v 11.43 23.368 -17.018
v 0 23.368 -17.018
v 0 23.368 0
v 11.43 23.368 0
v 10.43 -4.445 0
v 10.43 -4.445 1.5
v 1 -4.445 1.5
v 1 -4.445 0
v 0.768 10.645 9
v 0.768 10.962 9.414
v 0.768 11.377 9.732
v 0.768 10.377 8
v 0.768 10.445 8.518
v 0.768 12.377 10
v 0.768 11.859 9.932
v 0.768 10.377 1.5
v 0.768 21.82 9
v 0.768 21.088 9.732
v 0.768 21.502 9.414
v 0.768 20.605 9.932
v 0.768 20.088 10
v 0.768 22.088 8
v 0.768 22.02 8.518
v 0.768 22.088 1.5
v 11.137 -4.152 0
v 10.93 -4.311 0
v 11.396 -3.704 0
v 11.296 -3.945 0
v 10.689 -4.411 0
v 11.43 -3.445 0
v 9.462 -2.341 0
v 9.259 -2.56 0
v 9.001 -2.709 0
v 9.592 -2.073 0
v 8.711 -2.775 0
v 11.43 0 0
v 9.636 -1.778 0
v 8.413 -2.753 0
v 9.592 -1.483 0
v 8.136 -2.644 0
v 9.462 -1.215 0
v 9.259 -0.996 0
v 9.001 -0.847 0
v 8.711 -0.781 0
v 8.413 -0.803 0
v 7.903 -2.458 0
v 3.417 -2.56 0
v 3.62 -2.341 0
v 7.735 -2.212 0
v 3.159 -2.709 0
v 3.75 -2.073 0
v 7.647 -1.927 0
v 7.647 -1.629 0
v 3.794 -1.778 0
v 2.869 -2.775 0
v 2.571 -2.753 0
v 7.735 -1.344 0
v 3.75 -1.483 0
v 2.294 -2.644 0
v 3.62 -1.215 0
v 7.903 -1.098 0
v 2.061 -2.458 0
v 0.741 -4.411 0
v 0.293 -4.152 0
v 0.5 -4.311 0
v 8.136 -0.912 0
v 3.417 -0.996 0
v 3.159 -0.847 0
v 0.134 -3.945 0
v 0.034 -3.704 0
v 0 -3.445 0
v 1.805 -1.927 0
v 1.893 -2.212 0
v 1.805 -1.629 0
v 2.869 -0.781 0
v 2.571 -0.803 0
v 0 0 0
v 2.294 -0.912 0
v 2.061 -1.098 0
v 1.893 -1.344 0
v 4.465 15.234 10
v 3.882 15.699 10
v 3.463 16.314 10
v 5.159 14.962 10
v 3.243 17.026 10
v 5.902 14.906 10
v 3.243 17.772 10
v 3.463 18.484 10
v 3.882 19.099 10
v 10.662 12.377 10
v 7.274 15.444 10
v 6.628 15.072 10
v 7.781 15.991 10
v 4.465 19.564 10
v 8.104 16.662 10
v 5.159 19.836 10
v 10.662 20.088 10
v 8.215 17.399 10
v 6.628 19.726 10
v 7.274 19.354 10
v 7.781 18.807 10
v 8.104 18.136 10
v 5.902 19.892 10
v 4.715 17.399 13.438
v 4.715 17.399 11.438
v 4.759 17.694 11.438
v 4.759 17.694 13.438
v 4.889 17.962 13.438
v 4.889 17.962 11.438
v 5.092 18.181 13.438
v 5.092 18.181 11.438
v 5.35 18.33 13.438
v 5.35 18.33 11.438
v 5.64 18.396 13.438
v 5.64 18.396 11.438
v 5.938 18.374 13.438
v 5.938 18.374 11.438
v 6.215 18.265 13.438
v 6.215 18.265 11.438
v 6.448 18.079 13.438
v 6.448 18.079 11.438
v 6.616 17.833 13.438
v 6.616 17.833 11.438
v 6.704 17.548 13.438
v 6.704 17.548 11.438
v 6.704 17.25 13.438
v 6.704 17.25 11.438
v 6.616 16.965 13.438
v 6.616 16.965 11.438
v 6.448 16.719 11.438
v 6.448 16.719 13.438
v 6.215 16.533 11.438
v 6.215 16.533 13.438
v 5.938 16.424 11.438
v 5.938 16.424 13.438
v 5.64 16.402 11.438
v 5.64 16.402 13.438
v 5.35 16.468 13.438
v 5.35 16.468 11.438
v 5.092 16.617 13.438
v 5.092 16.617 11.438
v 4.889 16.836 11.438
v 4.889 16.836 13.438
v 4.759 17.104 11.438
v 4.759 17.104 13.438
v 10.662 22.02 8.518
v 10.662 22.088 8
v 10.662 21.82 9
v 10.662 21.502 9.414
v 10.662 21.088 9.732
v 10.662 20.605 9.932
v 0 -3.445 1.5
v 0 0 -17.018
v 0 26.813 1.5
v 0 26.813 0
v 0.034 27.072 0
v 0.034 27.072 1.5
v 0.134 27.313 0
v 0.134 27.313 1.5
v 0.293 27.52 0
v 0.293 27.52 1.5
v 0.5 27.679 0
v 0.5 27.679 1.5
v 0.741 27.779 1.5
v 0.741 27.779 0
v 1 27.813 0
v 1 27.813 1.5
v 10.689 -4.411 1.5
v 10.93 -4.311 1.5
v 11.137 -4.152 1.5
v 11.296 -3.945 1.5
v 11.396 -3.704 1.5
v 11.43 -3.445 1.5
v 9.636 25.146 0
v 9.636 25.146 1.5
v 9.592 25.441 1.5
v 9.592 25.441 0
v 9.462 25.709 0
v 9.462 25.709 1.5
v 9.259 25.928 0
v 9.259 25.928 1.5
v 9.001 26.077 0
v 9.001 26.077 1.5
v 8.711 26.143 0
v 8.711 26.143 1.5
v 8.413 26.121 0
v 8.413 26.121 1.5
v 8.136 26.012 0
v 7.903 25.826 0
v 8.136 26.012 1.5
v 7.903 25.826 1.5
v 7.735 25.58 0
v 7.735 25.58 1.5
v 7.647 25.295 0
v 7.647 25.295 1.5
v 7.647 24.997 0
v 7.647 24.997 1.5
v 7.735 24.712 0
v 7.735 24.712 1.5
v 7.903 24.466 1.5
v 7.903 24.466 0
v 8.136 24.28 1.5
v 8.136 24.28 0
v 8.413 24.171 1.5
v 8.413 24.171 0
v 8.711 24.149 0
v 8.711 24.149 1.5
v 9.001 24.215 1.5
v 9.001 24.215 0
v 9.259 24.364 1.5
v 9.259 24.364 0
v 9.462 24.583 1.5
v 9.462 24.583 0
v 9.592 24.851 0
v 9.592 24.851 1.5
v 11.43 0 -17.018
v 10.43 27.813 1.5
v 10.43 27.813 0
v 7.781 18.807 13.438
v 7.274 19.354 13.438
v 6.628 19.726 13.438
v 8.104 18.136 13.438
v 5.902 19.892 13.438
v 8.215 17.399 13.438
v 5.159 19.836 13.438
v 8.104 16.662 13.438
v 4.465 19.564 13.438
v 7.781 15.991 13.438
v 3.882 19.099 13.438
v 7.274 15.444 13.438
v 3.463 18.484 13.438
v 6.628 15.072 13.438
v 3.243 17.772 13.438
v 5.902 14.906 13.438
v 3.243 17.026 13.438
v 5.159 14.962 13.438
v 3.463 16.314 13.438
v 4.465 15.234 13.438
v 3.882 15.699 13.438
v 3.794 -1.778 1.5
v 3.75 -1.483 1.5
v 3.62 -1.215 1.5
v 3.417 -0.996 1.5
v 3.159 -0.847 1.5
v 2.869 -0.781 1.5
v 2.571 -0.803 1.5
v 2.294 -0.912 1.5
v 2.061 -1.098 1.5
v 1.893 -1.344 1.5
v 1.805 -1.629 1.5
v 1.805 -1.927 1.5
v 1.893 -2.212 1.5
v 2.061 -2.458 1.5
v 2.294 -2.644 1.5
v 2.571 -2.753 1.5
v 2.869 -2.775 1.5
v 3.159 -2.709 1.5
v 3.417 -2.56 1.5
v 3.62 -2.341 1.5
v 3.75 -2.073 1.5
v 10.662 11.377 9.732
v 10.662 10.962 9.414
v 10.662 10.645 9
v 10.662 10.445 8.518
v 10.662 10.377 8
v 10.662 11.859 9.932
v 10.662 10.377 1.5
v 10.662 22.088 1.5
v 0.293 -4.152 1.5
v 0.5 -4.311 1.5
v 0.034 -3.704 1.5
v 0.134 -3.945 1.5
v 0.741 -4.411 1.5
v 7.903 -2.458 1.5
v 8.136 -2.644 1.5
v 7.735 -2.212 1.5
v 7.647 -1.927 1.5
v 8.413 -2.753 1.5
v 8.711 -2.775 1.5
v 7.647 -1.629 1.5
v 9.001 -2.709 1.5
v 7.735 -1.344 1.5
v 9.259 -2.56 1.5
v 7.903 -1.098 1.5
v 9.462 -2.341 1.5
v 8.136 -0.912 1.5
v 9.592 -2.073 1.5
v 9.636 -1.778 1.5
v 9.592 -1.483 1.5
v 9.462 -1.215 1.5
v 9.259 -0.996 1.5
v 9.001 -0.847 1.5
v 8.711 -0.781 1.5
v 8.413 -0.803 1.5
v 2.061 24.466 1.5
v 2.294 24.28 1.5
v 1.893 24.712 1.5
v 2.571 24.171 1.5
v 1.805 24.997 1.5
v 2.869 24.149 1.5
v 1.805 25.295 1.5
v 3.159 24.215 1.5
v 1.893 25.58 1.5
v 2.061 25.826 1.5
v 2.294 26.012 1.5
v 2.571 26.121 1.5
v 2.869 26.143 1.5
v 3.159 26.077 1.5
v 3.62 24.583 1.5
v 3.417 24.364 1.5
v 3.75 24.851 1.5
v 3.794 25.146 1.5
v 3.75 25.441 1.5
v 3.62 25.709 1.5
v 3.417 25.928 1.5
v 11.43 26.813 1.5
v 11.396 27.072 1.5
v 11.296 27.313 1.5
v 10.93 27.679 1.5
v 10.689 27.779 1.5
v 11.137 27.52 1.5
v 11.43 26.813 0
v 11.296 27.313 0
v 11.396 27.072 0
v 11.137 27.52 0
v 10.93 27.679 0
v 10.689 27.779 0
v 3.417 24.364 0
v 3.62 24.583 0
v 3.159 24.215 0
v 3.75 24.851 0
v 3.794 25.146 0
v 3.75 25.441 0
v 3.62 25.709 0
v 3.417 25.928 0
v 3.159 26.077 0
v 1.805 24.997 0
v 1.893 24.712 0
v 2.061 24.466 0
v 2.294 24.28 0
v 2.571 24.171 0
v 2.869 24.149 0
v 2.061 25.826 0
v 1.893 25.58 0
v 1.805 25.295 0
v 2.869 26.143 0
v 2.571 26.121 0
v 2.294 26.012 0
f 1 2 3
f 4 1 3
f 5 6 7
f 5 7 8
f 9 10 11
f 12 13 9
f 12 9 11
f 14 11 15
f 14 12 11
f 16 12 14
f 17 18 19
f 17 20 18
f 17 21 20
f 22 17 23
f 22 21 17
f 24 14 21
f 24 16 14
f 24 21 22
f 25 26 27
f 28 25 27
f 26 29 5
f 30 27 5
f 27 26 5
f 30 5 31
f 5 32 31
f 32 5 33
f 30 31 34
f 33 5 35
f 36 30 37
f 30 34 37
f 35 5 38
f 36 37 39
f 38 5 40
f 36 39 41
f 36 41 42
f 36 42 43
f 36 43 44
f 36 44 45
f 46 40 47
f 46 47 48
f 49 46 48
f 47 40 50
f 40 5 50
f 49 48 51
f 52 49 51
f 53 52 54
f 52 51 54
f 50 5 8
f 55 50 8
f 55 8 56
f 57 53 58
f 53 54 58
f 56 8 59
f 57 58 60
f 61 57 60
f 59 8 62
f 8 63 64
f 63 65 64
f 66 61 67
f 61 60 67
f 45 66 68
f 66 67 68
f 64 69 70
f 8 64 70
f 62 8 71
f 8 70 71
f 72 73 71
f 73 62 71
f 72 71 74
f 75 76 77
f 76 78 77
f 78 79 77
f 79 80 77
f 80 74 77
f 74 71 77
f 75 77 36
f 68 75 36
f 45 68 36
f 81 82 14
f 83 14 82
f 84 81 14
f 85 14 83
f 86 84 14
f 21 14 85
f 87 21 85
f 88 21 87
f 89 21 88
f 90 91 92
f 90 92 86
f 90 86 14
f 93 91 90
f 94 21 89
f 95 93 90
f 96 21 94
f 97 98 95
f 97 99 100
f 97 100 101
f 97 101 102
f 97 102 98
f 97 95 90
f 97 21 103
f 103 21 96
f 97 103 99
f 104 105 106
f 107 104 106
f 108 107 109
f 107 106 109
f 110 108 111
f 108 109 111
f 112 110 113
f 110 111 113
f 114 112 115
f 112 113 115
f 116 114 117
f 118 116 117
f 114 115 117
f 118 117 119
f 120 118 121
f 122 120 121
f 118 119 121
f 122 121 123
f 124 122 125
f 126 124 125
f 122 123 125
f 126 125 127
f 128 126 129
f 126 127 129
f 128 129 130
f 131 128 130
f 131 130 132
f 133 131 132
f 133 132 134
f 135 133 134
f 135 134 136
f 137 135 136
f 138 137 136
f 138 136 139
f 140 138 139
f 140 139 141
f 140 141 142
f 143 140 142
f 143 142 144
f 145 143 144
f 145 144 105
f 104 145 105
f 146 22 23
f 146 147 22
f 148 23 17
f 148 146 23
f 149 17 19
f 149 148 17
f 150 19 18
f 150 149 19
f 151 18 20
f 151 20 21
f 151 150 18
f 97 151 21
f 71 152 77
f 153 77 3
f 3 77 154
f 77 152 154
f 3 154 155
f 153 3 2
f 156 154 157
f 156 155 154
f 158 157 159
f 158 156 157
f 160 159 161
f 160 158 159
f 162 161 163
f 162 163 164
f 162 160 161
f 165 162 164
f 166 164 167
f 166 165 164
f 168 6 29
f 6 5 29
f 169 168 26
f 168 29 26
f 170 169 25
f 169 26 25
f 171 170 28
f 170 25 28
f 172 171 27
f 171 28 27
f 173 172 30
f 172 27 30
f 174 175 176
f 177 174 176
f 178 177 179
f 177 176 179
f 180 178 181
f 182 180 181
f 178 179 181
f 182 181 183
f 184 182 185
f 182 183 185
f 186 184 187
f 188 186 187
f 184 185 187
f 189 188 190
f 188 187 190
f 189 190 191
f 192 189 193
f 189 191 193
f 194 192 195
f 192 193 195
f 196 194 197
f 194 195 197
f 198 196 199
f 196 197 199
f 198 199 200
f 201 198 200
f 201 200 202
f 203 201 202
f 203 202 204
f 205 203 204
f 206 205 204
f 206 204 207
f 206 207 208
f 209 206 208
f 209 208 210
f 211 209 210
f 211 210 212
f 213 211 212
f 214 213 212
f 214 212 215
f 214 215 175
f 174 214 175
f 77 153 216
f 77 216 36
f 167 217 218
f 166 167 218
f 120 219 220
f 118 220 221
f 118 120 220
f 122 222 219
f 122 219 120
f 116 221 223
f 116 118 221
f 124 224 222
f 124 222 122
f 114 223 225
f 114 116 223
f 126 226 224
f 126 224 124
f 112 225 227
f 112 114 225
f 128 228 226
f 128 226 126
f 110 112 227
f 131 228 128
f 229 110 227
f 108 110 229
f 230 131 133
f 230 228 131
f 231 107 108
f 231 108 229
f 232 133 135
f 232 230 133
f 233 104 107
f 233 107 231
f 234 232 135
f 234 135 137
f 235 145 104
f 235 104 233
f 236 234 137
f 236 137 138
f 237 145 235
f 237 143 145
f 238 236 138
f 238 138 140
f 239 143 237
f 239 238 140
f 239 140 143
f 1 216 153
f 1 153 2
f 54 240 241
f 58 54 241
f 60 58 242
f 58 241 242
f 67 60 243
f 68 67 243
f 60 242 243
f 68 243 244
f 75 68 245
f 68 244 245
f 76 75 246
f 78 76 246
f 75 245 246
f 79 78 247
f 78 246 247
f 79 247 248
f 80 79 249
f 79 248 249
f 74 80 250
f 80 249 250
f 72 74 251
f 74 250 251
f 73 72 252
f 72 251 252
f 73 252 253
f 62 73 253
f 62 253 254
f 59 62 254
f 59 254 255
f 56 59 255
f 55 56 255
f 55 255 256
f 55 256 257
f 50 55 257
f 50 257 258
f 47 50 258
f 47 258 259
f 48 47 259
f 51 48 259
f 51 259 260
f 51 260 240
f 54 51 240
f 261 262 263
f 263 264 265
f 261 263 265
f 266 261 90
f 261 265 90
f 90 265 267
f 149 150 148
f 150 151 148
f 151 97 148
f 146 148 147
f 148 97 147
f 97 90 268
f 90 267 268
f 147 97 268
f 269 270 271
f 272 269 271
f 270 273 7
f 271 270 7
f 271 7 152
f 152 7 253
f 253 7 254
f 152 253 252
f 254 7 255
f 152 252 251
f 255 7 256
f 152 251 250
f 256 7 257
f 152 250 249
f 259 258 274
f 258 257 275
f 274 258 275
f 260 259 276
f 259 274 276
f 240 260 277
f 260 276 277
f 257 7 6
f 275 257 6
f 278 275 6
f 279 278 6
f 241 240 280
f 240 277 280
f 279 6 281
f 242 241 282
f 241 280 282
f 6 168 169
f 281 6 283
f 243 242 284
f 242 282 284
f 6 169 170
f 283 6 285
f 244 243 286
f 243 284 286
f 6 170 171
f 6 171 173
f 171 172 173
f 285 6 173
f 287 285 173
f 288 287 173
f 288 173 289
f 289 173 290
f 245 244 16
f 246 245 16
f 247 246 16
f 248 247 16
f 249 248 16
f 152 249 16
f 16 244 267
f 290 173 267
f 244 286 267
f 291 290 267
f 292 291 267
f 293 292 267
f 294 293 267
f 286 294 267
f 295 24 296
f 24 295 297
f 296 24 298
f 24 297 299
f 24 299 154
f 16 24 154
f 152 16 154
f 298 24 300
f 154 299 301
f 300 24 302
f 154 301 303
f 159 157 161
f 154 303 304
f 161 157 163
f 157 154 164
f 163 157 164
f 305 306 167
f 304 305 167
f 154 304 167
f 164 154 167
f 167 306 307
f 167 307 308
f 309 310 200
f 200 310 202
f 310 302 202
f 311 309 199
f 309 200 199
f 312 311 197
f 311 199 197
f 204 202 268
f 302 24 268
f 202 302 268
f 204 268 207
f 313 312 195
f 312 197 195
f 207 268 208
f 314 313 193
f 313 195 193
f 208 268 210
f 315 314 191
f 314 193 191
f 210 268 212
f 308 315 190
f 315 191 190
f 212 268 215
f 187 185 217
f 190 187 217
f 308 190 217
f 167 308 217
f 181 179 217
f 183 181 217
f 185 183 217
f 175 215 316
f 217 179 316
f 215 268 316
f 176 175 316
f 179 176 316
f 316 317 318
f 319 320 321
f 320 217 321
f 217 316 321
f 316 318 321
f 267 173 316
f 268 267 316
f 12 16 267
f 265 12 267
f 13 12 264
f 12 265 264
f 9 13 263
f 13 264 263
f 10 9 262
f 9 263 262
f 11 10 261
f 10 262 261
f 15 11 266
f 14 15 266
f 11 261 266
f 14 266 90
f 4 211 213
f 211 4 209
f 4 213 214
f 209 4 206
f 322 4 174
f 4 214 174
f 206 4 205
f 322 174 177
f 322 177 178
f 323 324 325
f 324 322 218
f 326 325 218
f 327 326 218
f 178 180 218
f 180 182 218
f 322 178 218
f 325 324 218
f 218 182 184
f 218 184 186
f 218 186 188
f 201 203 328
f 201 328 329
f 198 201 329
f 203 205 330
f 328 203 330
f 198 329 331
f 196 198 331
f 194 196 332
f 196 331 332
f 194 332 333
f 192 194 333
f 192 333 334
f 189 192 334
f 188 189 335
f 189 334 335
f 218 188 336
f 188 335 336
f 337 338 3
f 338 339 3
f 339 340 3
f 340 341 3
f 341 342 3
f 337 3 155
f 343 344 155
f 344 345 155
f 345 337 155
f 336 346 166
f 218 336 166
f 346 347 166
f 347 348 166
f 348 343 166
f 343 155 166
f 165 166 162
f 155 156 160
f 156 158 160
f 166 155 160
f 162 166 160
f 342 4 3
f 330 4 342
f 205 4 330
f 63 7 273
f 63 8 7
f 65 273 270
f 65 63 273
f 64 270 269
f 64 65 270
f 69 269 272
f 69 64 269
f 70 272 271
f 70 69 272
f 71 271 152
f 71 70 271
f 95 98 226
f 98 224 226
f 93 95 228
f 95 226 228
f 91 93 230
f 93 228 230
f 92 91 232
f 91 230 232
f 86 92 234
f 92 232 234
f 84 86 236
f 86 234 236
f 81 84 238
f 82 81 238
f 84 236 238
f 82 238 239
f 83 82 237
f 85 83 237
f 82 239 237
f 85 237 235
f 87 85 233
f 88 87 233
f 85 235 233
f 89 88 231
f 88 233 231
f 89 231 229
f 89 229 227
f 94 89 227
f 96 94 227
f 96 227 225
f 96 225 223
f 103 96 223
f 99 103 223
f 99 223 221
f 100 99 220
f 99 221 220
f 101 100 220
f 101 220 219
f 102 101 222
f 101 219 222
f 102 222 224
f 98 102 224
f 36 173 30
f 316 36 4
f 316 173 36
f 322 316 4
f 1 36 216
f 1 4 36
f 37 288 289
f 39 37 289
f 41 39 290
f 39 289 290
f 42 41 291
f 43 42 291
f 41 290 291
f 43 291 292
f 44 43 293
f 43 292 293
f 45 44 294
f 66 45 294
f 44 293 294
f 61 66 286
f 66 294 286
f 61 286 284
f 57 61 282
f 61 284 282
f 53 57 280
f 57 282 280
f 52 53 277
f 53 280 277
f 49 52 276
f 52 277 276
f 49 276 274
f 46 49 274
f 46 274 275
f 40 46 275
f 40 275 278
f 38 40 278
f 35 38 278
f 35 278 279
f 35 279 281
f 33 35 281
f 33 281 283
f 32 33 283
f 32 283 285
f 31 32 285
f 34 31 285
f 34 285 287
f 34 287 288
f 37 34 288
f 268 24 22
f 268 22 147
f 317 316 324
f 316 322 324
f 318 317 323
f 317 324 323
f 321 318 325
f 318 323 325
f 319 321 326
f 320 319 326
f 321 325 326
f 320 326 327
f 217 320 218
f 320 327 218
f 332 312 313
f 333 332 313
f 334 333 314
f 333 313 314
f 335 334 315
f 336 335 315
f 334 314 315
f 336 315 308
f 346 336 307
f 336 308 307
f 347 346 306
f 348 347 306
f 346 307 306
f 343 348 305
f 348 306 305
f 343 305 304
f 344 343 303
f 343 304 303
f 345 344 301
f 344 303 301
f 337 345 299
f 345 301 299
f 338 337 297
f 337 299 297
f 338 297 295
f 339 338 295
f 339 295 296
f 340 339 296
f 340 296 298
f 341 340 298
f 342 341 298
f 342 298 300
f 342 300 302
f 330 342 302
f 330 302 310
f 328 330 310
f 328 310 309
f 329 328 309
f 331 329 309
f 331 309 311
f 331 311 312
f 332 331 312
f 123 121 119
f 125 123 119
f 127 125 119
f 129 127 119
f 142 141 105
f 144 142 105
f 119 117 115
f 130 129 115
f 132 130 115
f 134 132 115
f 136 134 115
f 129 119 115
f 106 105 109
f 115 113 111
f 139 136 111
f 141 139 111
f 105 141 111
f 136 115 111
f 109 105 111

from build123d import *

# Parameters (mm, degrees)
ESQUISSE1_W                       = 18.518
ESQUISSE1_H                       = 32.258
BOSS_EXTRU_1_DEPTH                = 11.43
ESQUISSE2_W                       = 17.018000001
ESQUISSE2_H                       = 4.44499999
ENL_V_MAT_EXTRU_1_DEPTH           = 12.43
ESQUISSE3_W                       = 17.018000001
ESQUISSE3_H                       = 4.44499999
ENL_V_MAT_EXTRU_2_DEPTH           = 12.43
ESQUISSE4_W                       = 9.89372273
ESQUISSE4_H                       = 11.711081898
BOSS_EXTRU_2_DEPTH                = 8.5
ESQUISSE5_W                       = 2.5
ESQUISSE5_H                       = 3.438
DIAM_TRE_DU_PER_AGE_2_0_2_1_D     = 2
DIAM_TRE_DU_PER_AGE_2_0_2_1_DEPTH = 2
DIAM_TRE_DU_PER_AGE_2_0_2_2_D     = 2
DIAM_TRE_DU_PER_AGE_2_0_2_2_DEPTH = 13.438
CONG_1_R                          = 1
CONG_2_R                          = 2


with BuildPart() as part:
    # Esquisse1 → Boss.-Extru.1 (new body)
    with BuildSketch(Plane(origin=(11.43, 0, 0), x_dir=(0, 0, -1), z_dir=(1, 0, 0))):
        with Locations((7.759, 11.684)):
            Rectangle(ESQUISSE1_W, ESQUISSE1_H)
    extrude(amount=-BOSS_EXTRU_1_DEPTH)

    # Esquisse2 → Enlèv. mat.-Extru.1 (cut, through all)
    with BuildSketch(Plane.ZY):
        with Locations((-8.509, -2.222500005)):
            Rectangle(ESQUISSE2_W, ESQUISSE2_H)
    extrude(amount=-ENL_V_MAT_EXTRU_1_DEPTH, mode=Mode.SUBTRACT)

    # Esquisse3 → Enlèv. mat.-Extru.2 (cut, through all)
    with BuildSketch(Plane.ZY):
        with Locations((-8.509, 25.590500005)):
            Rectangle(ESQUISSE3_W, ESQUISSE3_H)
    extrude(amount=-ENL_V_MAT_EXTRU_2_DEPTH, mode=Mode.SUBTRACT)

    # Esquisse4 → Boss.-Extru.2 (add)
    with BuildSketch(Plane.XY.offset(1.5)):
        with Locations((5.715, 16.232232421)):
            Rectangle(ESQUISSE4_W, ESQUISSE4_H)
    extrude(amount=BOSS_EXTRU_2_DEPTH)

    # Esquisse5 → Révolution1 (revolve)
    with BuildSketch(Plane.XZ.offset(-17.399)):
        with Locations((6.965, 11.719)):
            Rectangle(ESQUISSE5_W, ESQUISSE5_H)
    revolve(axis=Axis((5.715, 17.399, 13.438), (0, 0, -1)))

    # Diamètre du perçage Ø2.0 (2)1
    with Locations(Plane.XY.offset(13.438)):
        with Locations((5.715, 17.399)):
            Hole(DIAM_TRE_DU_PER_AGE_2_0_2_1_D / 2, depth=DIAM_TRE_DU_PER_AGE_2_0_2_1_DEPTH)

    # Diamètre du perçage Ø2.0 (2)2
    with Locations(Plane(origin=(0, 0, 0), x_dir=(-1, 0, 0), z_dir=(0, 0, -1))):
        with Locations((-2.794, -1.778), (-8.636, -1.778), (-8.636, 25.146), (-2.794, 25.146)):
            Hole(DIAM_TRE_DU_PER_AGE_2_0_2_2_D / 2, depth=DIAM_TRE_DU_PER_AGE_2_0_2_2_DEPTH)

    # Congé1
    cong_1_edges = [part.edges().sort_by_distance(p)[0] for p in [
        (11.43, 27.813, 0.750000001),
        (0, 27.813, 0.750000001),
        (11.43, -4.445, 0.750000001),
        (0, -4.445, 0.750000001),
    ]]
    fillet(cong_1_edges, radius=CONG_1_R)

    # Congé2
    cong_2_edges = [part.edges().sort_by_distance(p)[0] for p in [
        (5.715, 10.376691472, 10),
        (5.715, 22.08777337, 10),
    ]]
    fillet(cong_2_edges, radius=CONG_2_R)


solid = part.part
